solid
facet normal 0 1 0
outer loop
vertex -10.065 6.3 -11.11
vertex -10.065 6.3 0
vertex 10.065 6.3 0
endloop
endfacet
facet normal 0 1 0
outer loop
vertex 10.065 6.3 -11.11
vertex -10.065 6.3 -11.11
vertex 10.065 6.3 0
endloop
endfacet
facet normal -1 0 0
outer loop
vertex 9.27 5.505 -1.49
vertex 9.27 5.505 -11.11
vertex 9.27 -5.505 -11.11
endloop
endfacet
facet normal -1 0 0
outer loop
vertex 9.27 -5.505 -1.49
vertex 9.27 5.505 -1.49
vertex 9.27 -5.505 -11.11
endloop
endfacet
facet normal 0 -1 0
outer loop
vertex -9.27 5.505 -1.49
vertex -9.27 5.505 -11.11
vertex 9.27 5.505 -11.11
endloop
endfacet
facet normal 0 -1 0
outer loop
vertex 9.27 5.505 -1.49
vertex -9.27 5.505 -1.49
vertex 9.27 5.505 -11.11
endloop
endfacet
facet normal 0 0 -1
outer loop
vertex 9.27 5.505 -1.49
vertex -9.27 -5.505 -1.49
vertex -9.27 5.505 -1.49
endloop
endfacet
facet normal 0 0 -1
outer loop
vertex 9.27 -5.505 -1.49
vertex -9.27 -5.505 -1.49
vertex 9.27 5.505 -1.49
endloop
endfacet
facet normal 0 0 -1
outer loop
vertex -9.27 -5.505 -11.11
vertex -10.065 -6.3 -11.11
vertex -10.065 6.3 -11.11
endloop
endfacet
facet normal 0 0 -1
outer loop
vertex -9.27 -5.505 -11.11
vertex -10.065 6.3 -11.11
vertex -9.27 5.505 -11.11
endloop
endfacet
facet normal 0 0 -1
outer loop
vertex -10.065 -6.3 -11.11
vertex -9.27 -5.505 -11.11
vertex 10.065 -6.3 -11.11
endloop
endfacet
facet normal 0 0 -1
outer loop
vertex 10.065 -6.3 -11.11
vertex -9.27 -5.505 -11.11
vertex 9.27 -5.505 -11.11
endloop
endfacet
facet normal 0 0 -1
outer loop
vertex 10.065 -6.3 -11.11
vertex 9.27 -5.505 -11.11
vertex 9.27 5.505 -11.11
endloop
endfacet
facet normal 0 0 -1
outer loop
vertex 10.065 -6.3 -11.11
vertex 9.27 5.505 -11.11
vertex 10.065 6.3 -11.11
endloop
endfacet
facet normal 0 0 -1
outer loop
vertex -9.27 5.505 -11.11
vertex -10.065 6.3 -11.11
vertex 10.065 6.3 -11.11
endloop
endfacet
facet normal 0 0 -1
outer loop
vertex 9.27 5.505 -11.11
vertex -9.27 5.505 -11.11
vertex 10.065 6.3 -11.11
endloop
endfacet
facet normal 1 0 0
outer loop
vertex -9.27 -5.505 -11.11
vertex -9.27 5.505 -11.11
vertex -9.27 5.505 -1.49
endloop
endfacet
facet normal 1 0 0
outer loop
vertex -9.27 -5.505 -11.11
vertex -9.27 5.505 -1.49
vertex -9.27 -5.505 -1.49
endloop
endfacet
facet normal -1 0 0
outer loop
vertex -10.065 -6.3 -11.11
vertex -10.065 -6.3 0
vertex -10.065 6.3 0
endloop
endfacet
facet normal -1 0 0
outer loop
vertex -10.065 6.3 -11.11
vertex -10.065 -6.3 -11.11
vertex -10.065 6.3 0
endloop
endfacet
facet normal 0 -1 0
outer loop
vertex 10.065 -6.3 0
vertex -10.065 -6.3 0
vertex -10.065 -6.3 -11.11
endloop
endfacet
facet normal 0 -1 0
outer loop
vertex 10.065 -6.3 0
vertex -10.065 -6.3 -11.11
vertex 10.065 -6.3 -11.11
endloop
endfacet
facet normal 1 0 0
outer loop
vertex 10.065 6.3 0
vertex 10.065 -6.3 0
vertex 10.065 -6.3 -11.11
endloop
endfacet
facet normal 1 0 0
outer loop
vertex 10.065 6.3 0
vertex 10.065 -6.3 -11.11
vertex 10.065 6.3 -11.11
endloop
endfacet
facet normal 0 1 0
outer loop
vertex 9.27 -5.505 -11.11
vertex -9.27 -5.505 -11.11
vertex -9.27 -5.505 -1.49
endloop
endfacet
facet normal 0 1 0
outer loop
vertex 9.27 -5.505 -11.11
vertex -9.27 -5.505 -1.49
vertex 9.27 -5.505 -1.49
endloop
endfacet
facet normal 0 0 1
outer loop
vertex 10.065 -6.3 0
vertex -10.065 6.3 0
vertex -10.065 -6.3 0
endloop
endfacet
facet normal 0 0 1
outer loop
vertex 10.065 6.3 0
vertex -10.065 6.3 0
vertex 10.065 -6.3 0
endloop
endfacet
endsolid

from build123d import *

# Parameters (mm, degrees)
F0_W     = 20.13
F0_H     = 12.6
F1_DEPTH = 11.11
F2_W     = 18.54
F2_H     = 11.01
F3_DEPTH = 9.62


with BuildPart() as f1:
    # F0 (on Top) → F1 (new body)
    with BuildSketch(Plane.XY):
        Rectangle(F0_W, F0_H)
    extrude(amount=-F1_DEPTH)

    # F2 (on face) → F3 (cut)
    with BuildSketch(Plane(origin=(0, 0, -11.11), x_dir=(1, 0, 0), z_dir=(0, 0, -1))):
        Rectangle(F2_W, F2_H)
    extrude(amount=-F3_DEPTH, mode=Mode.SUBTRACT)


solid = f1.part
